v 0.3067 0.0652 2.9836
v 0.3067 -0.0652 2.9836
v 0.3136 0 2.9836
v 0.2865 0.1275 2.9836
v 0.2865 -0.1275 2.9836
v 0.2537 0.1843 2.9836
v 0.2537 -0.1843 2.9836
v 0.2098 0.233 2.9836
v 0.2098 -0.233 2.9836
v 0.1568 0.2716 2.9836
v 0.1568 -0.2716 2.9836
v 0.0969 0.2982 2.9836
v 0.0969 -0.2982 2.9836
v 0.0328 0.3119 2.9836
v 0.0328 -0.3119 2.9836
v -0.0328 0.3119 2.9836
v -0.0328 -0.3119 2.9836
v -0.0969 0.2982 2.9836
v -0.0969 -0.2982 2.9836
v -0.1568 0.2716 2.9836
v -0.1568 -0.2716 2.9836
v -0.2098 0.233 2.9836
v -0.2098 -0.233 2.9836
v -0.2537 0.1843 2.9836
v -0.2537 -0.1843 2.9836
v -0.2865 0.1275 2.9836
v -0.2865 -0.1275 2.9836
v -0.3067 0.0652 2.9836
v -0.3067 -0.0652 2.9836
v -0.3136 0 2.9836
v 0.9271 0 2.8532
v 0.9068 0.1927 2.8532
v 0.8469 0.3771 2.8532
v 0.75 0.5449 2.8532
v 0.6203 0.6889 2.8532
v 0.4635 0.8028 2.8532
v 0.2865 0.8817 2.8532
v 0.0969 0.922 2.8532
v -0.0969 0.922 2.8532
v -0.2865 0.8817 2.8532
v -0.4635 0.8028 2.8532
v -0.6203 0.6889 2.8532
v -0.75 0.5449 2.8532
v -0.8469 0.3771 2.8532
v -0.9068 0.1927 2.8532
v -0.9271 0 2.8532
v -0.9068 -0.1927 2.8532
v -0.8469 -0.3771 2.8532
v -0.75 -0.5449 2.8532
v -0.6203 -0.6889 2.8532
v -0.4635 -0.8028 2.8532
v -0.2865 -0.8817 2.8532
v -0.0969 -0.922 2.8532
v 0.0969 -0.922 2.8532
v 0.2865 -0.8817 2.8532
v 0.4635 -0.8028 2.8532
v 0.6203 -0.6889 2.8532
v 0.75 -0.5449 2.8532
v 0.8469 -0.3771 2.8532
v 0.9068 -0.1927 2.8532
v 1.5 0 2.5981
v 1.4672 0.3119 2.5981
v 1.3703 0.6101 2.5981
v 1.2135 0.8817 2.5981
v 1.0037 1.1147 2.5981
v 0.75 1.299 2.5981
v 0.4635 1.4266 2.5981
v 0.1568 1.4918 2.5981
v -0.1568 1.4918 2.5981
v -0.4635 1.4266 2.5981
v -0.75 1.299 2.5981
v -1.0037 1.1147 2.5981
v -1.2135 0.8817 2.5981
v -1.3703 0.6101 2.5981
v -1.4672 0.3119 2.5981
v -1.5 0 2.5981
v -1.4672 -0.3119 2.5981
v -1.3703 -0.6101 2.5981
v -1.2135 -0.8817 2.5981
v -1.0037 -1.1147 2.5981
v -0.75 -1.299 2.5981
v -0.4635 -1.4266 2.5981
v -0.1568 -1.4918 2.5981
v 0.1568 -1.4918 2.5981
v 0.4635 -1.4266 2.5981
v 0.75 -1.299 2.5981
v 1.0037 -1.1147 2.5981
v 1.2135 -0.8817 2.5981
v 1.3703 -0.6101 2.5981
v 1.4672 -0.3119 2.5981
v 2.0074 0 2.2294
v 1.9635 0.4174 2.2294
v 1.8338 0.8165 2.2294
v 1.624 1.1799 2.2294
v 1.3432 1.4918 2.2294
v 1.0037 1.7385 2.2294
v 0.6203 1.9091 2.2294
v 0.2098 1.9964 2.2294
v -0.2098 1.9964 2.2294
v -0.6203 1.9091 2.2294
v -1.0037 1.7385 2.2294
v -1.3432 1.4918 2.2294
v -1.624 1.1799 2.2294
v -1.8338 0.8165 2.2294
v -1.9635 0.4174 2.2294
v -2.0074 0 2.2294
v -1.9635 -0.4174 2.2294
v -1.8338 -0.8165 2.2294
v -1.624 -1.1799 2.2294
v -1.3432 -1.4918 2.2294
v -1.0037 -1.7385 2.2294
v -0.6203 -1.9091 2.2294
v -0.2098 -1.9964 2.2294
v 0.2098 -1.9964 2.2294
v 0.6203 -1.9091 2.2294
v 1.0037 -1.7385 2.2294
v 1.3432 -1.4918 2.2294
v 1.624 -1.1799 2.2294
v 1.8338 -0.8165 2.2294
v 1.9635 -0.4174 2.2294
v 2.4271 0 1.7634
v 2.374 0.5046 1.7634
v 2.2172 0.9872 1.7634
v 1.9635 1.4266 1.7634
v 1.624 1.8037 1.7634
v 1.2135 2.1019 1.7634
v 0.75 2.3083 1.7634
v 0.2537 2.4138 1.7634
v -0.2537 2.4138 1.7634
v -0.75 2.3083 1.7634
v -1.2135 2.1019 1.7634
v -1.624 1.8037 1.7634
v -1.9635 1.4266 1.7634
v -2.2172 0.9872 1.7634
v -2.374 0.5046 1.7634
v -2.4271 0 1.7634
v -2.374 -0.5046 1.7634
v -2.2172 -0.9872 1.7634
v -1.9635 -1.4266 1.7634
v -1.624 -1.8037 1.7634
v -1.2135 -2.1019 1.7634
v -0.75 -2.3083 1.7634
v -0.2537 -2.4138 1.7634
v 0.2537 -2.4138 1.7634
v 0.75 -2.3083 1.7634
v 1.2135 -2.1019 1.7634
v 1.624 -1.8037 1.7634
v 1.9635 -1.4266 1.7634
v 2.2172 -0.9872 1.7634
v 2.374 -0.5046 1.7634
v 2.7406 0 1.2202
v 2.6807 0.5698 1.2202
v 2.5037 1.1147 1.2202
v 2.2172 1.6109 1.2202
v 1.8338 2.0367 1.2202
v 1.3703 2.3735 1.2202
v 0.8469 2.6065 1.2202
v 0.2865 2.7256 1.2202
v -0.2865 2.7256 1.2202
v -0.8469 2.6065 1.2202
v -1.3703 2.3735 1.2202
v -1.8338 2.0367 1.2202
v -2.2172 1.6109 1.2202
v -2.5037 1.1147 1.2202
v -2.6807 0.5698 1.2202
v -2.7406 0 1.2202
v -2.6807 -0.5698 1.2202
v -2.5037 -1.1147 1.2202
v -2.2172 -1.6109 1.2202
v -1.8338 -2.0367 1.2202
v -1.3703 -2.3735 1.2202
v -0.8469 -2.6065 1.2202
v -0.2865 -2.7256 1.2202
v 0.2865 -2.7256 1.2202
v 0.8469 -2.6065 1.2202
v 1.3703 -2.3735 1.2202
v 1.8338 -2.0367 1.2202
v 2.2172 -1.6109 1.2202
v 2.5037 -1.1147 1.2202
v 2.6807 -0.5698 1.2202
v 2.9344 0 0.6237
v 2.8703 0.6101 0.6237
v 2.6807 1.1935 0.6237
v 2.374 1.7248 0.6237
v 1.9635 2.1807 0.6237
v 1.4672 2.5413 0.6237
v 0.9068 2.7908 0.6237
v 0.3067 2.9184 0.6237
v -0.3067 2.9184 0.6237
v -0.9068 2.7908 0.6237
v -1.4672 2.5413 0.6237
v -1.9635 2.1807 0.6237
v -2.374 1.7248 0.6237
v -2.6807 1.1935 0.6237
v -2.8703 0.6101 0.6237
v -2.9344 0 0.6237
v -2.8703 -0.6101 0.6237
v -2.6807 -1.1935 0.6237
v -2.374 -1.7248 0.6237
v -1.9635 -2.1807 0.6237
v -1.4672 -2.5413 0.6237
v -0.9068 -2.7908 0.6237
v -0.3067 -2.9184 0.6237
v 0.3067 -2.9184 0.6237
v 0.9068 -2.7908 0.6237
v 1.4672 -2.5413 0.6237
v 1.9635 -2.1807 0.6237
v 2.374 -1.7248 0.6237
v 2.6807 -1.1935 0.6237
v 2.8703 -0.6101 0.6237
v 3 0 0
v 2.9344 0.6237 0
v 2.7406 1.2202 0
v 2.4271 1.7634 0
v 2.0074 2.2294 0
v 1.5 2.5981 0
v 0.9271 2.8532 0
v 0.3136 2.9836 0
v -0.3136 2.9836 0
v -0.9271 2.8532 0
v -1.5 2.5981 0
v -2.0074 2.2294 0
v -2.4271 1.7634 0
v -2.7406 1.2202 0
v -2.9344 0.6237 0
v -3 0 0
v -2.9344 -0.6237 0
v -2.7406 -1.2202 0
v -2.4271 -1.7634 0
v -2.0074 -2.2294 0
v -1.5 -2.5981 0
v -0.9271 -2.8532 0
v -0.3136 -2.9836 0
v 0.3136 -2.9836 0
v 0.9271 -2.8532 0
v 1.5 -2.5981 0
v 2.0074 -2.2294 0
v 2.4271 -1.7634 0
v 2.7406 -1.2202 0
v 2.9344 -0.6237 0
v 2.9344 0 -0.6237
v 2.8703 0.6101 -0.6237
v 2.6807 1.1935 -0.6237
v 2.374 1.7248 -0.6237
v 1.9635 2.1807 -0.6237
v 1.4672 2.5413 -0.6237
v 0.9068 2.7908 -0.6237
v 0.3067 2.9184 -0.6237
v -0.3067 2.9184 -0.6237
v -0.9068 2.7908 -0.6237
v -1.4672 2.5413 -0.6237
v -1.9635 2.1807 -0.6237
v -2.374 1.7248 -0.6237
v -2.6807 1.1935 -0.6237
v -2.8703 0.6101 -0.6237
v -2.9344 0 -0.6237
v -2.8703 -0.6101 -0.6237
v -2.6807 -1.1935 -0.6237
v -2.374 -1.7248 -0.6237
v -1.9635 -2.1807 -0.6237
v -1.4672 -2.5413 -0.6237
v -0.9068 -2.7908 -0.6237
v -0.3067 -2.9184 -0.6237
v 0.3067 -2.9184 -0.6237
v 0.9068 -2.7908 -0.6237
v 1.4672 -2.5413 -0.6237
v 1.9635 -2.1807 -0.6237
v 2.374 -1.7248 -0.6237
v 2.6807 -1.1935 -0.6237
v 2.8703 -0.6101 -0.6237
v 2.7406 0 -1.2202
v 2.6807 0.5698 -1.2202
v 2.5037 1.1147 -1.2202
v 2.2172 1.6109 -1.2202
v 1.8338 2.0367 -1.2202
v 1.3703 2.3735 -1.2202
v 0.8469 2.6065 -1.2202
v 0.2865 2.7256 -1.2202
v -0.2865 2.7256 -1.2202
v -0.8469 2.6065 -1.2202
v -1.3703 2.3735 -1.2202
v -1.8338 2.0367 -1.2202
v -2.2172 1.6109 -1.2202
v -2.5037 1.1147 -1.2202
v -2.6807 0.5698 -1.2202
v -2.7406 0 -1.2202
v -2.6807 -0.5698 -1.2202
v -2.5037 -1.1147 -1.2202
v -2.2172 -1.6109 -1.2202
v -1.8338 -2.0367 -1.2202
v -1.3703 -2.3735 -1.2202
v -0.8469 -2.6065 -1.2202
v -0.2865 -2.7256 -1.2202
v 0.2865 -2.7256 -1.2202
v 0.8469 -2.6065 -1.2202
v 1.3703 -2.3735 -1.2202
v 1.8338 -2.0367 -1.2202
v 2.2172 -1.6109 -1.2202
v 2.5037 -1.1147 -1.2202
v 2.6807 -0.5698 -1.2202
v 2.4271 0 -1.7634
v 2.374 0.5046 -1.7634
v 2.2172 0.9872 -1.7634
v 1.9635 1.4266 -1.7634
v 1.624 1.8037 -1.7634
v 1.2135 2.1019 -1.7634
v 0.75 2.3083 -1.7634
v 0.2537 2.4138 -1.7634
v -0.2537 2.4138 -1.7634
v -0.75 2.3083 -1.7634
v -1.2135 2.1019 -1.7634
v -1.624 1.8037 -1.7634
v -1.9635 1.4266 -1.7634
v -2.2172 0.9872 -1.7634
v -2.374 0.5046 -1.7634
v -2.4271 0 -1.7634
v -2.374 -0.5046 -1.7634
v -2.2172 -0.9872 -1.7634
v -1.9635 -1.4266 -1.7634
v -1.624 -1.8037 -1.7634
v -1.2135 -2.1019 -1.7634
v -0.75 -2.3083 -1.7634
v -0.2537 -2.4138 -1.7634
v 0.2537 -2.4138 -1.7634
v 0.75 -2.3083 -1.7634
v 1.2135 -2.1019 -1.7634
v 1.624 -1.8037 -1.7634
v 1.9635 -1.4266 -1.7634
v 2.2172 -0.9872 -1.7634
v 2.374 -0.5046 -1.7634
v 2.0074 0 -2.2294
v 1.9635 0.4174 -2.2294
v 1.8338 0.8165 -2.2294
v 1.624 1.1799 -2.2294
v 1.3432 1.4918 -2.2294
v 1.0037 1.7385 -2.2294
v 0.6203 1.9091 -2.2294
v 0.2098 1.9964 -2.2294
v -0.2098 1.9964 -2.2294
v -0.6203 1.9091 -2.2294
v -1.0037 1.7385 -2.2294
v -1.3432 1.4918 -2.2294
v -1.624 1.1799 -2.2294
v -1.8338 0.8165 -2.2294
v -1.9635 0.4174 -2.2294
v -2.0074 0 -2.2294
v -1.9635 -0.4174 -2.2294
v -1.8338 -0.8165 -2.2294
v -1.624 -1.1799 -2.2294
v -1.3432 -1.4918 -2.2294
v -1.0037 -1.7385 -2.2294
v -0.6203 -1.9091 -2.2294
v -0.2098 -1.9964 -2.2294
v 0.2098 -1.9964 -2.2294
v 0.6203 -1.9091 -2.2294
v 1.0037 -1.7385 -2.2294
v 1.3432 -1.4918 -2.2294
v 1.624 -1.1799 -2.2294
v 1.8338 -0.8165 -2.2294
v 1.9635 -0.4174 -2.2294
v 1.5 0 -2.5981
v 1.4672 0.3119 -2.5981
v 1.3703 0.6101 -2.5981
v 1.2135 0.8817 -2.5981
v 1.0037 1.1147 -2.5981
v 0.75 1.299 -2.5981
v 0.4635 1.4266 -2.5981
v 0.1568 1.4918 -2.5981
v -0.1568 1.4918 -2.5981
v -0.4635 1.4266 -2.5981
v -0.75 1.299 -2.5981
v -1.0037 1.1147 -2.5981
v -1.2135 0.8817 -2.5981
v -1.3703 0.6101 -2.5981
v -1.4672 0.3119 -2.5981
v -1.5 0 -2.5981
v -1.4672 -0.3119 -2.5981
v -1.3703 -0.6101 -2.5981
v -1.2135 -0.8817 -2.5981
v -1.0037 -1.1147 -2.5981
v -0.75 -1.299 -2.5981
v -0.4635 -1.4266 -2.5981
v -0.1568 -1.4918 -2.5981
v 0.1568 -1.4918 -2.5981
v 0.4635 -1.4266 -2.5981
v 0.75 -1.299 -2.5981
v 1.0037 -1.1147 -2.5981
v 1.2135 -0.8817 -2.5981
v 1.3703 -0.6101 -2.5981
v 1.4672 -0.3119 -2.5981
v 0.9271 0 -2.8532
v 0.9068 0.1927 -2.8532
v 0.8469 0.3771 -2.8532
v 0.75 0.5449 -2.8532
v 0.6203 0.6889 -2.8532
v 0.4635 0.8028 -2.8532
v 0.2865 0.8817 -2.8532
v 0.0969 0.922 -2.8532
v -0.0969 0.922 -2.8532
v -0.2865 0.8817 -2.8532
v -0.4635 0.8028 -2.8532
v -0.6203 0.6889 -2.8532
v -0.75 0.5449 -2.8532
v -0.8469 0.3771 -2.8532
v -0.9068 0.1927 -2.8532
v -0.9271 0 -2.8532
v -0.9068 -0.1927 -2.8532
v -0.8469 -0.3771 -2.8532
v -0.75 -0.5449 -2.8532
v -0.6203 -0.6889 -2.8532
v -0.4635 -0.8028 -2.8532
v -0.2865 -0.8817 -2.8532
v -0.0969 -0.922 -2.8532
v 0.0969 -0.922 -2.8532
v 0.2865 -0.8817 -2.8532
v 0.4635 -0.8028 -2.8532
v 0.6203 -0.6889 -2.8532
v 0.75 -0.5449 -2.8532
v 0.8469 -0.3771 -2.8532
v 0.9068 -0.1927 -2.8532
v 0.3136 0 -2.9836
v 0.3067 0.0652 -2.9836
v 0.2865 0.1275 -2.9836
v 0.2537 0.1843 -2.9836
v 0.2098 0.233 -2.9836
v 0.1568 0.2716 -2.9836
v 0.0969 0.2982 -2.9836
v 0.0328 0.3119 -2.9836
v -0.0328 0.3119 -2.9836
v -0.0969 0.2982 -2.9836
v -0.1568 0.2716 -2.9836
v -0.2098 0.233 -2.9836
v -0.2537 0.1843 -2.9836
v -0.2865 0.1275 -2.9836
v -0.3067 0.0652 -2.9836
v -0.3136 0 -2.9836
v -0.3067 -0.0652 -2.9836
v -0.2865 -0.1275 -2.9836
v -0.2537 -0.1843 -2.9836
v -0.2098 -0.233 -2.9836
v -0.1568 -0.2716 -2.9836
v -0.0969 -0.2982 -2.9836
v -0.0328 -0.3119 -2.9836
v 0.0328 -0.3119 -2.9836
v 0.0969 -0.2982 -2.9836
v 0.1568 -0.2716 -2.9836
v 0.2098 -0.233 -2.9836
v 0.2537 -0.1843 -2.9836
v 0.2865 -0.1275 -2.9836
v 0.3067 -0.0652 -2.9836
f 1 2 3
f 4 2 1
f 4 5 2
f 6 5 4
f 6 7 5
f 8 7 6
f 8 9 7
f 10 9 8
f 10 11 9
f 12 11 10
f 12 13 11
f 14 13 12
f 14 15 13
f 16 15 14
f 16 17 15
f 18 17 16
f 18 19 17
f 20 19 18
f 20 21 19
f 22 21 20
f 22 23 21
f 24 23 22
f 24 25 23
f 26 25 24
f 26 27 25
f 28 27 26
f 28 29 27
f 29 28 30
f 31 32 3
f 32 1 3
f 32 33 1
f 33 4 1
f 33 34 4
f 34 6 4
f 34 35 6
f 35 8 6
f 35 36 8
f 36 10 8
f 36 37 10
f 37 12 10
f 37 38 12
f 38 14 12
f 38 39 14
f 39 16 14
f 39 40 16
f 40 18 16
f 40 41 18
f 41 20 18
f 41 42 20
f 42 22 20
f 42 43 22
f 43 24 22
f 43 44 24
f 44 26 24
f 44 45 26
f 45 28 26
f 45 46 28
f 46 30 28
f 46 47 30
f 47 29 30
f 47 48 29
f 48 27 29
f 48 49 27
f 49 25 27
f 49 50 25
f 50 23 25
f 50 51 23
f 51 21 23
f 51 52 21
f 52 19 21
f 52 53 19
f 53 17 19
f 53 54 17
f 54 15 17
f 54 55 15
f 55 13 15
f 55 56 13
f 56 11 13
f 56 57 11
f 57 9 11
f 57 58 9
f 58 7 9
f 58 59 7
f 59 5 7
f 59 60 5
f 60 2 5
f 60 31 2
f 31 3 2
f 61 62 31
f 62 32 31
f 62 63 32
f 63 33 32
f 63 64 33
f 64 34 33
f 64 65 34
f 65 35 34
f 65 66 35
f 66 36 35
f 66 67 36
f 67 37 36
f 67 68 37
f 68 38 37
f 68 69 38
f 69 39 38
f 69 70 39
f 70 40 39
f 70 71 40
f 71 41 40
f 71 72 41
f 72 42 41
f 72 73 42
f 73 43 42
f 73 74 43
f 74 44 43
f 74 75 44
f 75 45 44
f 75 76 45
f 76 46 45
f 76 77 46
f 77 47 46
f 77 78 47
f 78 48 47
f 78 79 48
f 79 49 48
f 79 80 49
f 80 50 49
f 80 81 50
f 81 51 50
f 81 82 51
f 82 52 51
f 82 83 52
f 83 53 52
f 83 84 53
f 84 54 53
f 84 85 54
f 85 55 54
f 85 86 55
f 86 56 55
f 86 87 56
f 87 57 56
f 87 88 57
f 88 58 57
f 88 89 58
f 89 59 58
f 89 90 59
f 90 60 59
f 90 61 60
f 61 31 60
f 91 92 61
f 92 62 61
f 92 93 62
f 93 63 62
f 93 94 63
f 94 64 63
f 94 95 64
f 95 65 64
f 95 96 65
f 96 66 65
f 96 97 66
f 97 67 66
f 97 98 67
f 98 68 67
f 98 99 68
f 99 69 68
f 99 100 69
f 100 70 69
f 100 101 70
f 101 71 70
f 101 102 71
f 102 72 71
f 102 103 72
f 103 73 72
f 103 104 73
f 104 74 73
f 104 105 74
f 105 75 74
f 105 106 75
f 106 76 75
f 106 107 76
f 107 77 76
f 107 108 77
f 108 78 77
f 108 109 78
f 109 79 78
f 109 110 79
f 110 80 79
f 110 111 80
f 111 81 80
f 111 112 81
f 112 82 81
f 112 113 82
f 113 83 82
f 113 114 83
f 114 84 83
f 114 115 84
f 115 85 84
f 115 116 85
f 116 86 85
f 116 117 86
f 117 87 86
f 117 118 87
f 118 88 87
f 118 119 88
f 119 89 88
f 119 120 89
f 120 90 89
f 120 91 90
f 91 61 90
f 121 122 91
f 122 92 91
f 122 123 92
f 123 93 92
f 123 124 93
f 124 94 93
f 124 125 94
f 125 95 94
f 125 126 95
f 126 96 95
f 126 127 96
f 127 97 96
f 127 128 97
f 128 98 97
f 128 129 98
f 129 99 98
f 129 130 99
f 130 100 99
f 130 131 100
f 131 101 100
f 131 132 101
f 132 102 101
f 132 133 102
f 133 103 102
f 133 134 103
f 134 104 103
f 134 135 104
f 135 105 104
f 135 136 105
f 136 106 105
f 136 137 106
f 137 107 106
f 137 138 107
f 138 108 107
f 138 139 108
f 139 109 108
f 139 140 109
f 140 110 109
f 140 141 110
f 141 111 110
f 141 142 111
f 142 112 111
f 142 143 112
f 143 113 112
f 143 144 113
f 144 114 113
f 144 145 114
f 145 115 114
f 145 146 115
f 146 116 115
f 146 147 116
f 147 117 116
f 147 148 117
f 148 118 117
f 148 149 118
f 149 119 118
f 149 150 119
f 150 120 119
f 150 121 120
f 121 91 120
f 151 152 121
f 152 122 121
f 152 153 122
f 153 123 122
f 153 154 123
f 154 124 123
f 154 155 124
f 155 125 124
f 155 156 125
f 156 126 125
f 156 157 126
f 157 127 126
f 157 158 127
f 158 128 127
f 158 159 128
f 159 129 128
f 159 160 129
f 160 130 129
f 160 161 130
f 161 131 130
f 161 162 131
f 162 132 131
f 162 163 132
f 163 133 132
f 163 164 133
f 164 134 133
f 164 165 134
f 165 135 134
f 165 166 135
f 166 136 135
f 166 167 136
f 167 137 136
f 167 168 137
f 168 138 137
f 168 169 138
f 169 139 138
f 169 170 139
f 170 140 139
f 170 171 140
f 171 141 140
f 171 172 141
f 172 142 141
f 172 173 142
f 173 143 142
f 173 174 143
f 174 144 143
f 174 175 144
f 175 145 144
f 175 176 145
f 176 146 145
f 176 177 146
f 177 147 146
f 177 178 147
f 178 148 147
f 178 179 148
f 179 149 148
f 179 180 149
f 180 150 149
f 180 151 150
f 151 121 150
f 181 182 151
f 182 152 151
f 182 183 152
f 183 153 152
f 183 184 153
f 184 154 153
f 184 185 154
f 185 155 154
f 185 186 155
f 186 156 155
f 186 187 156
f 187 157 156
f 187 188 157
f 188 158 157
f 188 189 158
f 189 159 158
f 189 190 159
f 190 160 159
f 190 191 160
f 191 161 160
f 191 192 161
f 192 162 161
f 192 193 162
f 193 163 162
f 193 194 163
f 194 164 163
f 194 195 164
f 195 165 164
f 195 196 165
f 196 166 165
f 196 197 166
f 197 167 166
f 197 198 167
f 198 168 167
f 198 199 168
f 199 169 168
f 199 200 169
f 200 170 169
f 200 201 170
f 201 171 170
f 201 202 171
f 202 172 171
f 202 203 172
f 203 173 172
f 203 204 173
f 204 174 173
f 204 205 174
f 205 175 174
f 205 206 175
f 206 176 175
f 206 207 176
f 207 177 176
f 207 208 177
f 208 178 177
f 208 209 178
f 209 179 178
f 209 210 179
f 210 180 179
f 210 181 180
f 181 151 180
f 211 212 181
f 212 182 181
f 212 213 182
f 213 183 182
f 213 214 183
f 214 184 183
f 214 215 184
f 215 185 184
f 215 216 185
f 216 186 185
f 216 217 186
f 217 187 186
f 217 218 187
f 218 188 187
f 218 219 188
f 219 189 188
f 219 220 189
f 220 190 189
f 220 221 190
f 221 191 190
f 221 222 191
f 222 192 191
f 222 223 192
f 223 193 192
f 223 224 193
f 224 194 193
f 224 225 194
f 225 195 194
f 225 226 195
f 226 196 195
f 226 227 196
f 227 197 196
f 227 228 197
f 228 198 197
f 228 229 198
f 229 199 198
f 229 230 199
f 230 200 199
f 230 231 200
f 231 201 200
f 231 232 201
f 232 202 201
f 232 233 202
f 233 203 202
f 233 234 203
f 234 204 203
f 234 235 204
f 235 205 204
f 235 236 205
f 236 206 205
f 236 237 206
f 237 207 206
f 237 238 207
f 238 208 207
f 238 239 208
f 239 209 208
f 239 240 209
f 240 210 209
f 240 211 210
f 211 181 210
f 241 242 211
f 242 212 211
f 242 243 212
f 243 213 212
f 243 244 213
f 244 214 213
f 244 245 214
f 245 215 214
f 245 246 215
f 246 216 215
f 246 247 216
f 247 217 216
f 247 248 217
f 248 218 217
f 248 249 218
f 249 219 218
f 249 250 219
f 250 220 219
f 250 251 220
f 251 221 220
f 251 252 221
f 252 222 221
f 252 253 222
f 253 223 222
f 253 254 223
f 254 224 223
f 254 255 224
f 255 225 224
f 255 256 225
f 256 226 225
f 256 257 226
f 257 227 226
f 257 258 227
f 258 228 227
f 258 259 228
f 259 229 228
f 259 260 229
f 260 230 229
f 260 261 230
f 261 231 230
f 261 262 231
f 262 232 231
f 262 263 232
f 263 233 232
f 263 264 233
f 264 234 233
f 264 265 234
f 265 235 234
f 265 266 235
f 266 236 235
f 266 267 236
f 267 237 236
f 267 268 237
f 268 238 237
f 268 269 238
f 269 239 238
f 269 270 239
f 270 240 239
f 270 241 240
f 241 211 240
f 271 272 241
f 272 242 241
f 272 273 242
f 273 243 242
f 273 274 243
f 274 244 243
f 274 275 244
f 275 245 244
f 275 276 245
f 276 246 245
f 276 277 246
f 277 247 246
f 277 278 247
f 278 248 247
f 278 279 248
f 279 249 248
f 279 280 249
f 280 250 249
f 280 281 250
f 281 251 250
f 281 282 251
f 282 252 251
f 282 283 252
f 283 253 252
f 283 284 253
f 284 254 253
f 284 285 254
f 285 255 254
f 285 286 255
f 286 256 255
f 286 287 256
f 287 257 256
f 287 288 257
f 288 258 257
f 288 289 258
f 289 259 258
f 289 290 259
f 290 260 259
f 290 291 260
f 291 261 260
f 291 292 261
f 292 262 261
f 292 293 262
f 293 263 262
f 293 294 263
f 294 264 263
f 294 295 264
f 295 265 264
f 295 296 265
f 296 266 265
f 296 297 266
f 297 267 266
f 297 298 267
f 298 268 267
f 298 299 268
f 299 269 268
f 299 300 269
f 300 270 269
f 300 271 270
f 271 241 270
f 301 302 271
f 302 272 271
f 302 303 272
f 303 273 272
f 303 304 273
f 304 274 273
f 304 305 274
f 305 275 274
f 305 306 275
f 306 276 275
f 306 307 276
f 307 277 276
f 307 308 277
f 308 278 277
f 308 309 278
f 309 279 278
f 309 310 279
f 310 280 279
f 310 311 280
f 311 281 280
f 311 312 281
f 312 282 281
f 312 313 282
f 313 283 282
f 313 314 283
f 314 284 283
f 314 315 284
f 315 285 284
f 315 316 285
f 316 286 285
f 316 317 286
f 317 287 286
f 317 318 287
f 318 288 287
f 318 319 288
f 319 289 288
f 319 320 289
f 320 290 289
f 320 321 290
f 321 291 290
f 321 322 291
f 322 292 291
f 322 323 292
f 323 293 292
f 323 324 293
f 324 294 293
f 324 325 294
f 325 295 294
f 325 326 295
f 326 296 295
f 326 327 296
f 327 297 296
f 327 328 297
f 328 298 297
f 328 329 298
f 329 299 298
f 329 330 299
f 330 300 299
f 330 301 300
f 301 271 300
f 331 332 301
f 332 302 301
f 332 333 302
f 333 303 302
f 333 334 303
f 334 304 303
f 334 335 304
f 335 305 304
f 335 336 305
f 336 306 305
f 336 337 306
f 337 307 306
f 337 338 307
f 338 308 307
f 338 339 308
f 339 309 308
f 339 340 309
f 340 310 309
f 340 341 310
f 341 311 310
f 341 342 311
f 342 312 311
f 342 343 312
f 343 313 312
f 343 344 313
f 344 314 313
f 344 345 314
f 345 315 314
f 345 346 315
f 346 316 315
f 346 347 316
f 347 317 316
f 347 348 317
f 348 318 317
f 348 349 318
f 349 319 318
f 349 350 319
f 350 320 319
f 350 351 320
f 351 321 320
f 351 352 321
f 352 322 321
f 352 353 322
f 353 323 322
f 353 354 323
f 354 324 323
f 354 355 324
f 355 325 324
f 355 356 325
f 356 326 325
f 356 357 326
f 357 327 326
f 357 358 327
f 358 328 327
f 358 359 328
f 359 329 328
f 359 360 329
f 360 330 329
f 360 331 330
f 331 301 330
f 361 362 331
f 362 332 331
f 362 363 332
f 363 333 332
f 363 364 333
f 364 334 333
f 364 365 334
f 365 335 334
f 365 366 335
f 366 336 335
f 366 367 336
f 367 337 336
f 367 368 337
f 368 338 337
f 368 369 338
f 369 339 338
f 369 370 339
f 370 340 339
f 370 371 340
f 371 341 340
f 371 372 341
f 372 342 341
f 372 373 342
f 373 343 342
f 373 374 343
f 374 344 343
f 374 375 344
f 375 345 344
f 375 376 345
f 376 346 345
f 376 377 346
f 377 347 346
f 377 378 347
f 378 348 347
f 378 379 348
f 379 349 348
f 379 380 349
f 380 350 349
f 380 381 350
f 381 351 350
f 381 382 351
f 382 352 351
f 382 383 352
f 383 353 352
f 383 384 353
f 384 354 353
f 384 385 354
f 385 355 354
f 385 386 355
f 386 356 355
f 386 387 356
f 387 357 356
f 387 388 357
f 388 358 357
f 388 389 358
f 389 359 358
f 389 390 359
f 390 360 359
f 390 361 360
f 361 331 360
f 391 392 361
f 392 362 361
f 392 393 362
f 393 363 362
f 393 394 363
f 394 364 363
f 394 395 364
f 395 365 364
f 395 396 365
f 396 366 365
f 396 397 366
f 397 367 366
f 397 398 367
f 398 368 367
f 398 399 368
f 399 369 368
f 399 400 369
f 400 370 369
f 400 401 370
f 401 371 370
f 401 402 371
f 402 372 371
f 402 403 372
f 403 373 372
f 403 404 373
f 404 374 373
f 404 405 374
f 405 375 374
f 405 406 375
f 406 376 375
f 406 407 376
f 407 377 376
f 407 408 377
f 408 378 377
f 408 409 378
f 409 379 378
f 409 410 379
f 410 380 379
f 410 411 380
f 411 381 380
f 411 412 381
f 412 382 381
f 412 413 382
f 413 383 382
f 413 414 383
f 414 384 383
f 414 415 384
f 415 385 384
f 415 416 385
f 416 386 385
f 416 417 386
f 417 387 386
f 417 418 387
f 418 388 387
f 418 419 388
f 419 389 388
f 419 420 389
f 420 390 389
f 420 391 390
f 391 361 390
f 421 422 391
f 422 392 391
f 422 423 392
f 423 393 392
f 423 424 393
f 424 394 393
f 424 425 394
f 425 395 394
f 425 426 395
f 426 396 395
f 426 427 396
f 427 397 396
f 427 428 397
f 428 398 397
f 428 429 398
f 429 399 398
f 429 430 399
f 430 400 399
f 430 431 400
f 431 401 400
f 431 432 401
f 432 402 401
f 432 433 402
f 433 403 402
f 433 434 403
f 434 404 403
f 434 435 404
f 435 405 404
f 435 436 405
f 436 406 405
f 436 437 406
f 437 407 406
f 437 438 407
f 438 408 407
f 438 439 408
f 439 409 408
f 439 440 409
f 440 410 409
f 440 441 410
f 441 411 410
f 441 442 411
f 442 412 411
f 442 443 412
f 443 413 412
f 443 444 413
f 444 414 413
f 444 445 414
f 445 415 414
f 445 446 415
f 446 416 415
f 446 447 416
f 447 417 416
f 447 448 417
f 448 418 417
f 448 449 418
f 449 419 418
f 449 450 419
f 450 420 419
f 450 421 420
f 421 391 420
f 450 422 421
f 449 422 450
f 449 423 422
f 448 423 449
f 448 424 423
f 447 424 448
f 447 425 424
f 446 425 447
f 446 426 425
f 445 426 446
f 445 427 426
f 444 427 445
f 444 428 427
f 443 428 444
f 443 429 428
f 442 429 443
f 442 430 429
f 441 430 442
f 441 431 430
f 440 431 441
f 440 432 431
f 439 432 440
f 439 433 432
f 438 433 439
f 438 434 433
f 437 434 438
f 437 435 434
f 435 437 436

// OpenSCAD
/*
 * OpenSCAD Workshop Examples
 * Copyright (c) 2013 Anar Software LLC. < http://anars.com >
 *
 * This program is free software: you can redistribute it and/or modify it under
 * the terms of the GNU General Public License as published by the Free Software
 * Foundation, either version 3 of the License, or (at your option) any later
 * version.
 *
 * This program is distributed in the hope that it will be useful, but WITHOUT
 * ANY WARRANTY; without even the implied warranty of MERCHANTABILITY or FITNESS
 * FOR A PARTICULAR PURPOSE. See the GNU General Public License for more details.
 *
 * You should have received a copy of the GNU General Public License along with
 * this program. If not, see < http://www.gnu.org/licenses/ >
 *
 */
/*

Creates 3 unit radius sphere.

Parameters :

	sphere(r = x);

*/

$fs = 0;

sphere(r = 3);
